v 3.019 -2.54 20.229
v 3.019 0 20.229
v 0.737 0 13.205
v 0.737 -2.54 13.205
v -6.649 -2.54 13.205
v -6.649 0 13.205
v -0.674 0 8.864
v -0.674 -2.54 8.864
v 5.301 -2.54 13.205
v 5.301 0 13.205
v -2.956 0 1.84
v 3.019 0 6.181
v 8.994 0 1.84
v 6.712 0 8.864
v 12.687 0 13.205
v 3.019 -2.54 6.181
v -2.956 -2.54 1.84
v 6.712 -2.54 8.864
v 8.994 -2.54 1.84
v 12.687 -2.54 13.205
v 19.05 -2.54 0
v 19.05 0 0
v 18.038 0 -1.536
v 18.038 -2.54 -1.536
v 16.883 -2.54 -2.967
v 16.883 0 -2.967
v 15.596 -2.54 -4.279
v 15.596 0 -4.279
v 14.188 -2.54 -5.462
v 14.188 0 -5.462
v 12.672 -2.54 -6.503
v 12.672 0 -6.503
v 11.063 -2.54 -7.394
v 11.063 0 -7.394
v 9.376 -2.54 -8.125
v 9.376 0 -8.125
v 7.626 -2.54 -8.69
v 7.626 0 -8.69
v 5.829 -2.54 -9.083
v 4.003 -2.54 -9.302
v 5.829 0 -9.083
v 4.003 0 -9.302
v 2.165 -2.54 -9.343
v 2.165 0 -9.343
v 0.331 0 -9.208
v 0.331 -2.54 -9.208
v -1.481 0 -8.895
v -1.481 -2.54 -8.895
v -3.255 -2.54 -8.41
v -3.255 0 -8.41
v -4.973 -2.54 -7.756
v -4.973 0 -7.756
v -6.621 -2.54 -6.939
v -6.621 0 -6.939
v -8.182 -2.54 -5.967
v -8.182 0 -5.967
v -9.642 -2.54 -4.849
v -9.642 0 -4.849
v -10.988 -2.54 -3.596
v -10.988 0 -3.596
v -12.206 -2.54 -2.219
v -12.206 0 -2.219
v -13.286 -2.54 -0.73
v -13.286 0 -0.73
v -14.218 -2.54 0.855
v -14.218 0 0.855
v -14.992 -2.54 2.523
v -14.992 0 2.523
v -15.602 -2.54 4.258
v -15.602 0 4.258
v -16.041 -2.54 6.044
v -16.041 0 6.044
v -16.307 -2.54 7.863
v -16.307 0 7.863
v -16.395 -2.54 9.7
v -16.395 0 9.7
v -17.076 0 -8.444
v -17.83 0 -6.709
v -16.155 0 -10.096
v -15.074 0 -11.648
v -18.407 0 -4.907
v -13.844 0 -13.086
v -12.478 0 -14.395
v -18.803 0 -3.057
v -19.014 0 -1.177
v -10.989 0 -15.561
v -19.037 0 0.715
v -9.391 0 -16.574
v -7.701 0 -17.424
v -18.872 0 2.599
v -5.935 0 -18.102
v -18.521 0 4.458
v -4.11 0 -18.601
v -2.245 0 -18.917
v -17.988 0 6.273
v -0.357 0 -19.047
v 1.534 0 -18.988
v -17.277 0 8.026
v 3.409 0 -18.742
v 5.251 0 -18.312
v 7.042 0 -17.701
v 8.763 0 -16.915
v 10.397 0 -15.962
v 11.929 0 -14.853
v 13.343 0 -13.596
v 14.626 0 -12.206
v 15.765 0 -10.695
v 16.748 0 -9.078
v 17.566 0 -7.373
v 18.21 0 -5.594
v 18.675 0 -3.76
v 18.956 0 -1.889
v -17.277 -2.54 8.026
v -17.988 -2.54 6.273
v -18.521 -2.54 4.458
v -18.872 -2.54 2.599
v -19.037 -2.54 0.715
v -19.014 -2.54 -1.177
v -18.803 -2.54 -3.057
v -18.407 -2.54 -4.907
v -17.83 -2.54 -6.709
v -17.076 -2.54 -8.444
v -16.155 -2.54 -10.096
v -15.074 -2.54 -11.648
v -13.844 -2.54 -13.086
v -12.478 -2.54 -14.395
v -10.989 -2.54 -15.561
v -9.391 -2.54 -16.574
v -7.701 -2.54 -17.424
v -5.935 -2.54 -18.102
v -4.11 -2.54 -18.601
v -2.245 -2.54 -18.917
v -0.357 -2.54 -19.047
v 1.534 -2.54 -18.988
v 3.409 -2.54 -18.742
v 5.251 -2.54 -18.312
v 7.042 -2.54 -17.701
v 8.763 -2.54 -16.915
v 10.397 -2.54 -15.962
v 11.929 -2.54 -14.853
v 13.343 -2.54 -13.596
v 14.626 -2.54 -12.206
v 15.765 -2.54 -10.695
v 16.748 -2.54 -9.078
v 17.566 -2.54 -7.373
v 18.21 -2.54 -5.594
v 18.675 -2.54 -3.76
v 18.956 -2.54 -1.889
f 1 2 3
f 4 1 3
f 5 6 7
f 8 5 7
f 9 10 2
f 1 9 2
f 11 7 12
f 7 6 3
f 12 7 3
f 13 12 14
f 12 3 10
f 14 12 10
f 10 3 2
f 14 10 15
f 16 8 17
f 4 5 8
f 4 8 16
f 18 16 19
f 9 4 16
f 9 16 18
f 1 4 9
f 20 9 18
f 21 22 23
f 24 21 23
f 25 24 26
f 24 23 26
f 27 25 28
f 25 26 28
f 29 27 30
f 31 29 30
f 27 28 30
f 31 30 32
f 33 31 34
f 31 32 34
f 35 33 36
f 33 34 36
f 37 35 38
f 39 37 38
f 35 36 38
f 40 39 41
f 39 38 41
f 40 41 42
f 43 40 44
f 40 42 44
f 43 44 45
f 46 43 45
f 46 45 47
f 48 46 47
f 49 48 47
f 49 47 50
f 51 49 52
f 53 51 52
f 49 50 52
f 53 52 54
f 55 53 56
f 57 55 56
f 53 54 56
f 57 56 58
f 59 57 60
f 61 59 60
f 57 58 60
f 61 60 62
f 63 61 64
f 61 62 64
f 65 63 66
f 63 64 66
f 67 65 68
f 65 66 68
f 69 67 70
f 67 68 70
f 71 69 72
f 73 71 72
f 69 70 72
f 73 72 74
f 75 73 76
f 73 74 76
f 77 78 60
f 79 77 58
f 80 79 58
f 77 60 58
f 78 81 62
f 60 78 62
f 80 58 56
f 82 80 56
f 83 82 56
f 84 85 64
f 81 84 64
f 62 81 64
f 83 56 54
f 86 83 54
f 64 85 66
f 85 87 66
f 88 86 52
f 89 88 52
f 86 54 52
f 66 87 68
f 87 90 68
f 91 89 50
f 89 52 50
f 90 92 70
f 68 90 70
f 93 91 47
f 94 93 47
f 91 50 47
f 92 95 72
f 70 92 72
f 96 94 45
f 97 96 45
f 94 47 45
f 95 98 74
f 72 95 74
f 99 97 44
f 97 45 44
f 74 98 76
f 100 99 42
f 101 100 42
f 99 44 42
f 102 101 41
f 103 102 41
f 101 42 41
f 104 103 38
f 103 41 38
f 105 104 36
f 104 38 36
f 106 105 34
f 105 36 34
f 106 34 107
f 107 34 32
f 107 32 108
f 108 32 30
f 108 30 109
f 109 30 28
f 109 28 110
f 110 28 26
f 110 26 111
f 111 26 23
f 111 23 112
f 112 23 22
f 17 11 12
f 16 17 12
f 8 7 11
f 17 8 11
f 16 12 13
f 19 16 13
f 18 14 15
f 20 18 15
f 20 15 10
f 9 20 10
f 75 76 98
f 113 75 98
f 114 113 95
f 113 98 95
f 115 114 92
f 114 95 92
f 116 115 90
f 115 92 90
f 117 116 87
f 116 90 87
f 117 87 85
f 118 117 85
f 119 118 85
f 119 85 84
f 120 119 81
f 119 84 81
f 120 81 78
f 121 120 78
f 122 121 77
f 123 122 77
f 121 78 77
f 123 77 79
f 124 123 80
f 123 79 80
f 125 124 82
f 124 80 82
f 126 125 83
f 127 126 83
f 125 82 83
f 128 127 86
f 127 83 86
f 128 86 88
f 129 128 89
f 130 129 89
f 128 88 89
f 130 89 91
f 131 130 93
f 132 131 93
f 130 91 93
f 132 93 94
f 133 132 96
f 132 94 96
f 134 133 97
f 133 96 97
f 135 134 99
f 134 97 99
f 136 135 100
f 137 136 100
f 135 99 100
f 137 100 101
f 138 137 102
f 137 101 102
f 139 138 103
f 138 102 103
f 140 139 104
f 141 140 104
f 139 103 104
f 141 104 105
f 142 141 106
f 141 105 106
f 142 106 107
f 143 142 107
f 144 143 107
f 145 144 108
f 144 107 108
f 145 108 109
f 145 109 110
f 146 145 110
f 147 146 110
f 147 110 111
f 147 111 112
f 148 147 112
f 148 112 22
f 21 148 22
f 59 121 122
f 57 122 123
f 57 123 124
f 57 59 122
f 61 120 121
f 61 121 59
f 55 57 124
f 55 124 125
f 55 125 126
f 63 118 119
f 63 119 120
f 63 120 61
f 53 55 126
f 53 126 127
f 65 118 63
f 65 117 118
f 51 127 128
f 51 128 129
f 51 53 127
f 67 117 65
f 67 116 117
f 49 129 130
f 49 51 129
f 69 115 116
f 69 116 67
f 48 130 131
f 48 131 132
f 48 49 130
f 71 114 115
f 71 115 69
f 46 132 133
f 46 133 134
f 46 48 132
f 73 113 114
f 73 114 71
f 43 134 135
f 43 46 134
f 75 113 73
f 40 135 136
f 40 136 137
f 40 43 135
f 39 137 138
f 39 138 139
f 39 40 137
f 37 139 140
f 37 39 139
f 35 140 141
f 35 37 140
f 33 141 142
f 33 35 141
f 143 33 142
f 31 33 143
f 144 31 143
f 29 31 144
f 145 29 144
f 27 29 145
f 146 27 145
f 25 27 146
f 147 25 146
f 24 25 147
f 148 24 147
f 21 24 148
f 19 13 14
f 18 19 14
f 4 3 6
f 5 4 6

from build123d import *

# Parameters (mm, degrees)
F1_DEPTH = 2.54
F3_DEPTH = 2.54


with BuildPart() as f1:
    # F0 (on Front) → F1 (new body)
    with BuildSketch(Plane.XZ):
        with BuildLine():
            ThreePointArc((-16.3953601137, 9.7002405508), (-5.0284634748, -18.3743586305), (19.05, 0))
            ThreePointArc((19.05, 0), (-2.3738235885, -8.6741180797), (-16.3953601137, 9.7002405508))
        make_face()
    extrude(amount=F1_DEPTH)


with BuildPart() as f3:
    # F2 (on Front) → F3 (new body)
    with BuildSketch(Plane.XZ):
        Polygon((5.3014953599, 13.205398481), (3.0192455743, 20.2294410739), (0.7369957886, 13.205398481), align=None)
        Polygon((0.7369957886, 13.205398481), (-6.6485196593, 13.205398481), (-0.6735121497, 8.8643014201), align=None)
        Polygon((3.0192455743, 6.1813558881), (6.7120032982, 8.8643014201), (5.3014953599, 13.205398481), (0.7369957886, 13.205398481), (-0.6735121497, 8.8643014201), align=None)
        Polygon((6.7120032982, 8.8643014201), (12.6870108078, 13.205398481), (5.3014953599, 13.205398481), align=None)
        Polygon((3.0192455743, 6.1813558881), (8.9942530838, 1.8402588272), (6.7120032982, 8.8643014201), align=None)
        Polygon((-0.6735121497, 8.8643014201), (-2.9557619353, 1.8402588272), (3.0192455743, 6.1813558881), align=None)
    extrude(amount=F3_DEPTH)


solid = Compound([f1.part, f3.part])
